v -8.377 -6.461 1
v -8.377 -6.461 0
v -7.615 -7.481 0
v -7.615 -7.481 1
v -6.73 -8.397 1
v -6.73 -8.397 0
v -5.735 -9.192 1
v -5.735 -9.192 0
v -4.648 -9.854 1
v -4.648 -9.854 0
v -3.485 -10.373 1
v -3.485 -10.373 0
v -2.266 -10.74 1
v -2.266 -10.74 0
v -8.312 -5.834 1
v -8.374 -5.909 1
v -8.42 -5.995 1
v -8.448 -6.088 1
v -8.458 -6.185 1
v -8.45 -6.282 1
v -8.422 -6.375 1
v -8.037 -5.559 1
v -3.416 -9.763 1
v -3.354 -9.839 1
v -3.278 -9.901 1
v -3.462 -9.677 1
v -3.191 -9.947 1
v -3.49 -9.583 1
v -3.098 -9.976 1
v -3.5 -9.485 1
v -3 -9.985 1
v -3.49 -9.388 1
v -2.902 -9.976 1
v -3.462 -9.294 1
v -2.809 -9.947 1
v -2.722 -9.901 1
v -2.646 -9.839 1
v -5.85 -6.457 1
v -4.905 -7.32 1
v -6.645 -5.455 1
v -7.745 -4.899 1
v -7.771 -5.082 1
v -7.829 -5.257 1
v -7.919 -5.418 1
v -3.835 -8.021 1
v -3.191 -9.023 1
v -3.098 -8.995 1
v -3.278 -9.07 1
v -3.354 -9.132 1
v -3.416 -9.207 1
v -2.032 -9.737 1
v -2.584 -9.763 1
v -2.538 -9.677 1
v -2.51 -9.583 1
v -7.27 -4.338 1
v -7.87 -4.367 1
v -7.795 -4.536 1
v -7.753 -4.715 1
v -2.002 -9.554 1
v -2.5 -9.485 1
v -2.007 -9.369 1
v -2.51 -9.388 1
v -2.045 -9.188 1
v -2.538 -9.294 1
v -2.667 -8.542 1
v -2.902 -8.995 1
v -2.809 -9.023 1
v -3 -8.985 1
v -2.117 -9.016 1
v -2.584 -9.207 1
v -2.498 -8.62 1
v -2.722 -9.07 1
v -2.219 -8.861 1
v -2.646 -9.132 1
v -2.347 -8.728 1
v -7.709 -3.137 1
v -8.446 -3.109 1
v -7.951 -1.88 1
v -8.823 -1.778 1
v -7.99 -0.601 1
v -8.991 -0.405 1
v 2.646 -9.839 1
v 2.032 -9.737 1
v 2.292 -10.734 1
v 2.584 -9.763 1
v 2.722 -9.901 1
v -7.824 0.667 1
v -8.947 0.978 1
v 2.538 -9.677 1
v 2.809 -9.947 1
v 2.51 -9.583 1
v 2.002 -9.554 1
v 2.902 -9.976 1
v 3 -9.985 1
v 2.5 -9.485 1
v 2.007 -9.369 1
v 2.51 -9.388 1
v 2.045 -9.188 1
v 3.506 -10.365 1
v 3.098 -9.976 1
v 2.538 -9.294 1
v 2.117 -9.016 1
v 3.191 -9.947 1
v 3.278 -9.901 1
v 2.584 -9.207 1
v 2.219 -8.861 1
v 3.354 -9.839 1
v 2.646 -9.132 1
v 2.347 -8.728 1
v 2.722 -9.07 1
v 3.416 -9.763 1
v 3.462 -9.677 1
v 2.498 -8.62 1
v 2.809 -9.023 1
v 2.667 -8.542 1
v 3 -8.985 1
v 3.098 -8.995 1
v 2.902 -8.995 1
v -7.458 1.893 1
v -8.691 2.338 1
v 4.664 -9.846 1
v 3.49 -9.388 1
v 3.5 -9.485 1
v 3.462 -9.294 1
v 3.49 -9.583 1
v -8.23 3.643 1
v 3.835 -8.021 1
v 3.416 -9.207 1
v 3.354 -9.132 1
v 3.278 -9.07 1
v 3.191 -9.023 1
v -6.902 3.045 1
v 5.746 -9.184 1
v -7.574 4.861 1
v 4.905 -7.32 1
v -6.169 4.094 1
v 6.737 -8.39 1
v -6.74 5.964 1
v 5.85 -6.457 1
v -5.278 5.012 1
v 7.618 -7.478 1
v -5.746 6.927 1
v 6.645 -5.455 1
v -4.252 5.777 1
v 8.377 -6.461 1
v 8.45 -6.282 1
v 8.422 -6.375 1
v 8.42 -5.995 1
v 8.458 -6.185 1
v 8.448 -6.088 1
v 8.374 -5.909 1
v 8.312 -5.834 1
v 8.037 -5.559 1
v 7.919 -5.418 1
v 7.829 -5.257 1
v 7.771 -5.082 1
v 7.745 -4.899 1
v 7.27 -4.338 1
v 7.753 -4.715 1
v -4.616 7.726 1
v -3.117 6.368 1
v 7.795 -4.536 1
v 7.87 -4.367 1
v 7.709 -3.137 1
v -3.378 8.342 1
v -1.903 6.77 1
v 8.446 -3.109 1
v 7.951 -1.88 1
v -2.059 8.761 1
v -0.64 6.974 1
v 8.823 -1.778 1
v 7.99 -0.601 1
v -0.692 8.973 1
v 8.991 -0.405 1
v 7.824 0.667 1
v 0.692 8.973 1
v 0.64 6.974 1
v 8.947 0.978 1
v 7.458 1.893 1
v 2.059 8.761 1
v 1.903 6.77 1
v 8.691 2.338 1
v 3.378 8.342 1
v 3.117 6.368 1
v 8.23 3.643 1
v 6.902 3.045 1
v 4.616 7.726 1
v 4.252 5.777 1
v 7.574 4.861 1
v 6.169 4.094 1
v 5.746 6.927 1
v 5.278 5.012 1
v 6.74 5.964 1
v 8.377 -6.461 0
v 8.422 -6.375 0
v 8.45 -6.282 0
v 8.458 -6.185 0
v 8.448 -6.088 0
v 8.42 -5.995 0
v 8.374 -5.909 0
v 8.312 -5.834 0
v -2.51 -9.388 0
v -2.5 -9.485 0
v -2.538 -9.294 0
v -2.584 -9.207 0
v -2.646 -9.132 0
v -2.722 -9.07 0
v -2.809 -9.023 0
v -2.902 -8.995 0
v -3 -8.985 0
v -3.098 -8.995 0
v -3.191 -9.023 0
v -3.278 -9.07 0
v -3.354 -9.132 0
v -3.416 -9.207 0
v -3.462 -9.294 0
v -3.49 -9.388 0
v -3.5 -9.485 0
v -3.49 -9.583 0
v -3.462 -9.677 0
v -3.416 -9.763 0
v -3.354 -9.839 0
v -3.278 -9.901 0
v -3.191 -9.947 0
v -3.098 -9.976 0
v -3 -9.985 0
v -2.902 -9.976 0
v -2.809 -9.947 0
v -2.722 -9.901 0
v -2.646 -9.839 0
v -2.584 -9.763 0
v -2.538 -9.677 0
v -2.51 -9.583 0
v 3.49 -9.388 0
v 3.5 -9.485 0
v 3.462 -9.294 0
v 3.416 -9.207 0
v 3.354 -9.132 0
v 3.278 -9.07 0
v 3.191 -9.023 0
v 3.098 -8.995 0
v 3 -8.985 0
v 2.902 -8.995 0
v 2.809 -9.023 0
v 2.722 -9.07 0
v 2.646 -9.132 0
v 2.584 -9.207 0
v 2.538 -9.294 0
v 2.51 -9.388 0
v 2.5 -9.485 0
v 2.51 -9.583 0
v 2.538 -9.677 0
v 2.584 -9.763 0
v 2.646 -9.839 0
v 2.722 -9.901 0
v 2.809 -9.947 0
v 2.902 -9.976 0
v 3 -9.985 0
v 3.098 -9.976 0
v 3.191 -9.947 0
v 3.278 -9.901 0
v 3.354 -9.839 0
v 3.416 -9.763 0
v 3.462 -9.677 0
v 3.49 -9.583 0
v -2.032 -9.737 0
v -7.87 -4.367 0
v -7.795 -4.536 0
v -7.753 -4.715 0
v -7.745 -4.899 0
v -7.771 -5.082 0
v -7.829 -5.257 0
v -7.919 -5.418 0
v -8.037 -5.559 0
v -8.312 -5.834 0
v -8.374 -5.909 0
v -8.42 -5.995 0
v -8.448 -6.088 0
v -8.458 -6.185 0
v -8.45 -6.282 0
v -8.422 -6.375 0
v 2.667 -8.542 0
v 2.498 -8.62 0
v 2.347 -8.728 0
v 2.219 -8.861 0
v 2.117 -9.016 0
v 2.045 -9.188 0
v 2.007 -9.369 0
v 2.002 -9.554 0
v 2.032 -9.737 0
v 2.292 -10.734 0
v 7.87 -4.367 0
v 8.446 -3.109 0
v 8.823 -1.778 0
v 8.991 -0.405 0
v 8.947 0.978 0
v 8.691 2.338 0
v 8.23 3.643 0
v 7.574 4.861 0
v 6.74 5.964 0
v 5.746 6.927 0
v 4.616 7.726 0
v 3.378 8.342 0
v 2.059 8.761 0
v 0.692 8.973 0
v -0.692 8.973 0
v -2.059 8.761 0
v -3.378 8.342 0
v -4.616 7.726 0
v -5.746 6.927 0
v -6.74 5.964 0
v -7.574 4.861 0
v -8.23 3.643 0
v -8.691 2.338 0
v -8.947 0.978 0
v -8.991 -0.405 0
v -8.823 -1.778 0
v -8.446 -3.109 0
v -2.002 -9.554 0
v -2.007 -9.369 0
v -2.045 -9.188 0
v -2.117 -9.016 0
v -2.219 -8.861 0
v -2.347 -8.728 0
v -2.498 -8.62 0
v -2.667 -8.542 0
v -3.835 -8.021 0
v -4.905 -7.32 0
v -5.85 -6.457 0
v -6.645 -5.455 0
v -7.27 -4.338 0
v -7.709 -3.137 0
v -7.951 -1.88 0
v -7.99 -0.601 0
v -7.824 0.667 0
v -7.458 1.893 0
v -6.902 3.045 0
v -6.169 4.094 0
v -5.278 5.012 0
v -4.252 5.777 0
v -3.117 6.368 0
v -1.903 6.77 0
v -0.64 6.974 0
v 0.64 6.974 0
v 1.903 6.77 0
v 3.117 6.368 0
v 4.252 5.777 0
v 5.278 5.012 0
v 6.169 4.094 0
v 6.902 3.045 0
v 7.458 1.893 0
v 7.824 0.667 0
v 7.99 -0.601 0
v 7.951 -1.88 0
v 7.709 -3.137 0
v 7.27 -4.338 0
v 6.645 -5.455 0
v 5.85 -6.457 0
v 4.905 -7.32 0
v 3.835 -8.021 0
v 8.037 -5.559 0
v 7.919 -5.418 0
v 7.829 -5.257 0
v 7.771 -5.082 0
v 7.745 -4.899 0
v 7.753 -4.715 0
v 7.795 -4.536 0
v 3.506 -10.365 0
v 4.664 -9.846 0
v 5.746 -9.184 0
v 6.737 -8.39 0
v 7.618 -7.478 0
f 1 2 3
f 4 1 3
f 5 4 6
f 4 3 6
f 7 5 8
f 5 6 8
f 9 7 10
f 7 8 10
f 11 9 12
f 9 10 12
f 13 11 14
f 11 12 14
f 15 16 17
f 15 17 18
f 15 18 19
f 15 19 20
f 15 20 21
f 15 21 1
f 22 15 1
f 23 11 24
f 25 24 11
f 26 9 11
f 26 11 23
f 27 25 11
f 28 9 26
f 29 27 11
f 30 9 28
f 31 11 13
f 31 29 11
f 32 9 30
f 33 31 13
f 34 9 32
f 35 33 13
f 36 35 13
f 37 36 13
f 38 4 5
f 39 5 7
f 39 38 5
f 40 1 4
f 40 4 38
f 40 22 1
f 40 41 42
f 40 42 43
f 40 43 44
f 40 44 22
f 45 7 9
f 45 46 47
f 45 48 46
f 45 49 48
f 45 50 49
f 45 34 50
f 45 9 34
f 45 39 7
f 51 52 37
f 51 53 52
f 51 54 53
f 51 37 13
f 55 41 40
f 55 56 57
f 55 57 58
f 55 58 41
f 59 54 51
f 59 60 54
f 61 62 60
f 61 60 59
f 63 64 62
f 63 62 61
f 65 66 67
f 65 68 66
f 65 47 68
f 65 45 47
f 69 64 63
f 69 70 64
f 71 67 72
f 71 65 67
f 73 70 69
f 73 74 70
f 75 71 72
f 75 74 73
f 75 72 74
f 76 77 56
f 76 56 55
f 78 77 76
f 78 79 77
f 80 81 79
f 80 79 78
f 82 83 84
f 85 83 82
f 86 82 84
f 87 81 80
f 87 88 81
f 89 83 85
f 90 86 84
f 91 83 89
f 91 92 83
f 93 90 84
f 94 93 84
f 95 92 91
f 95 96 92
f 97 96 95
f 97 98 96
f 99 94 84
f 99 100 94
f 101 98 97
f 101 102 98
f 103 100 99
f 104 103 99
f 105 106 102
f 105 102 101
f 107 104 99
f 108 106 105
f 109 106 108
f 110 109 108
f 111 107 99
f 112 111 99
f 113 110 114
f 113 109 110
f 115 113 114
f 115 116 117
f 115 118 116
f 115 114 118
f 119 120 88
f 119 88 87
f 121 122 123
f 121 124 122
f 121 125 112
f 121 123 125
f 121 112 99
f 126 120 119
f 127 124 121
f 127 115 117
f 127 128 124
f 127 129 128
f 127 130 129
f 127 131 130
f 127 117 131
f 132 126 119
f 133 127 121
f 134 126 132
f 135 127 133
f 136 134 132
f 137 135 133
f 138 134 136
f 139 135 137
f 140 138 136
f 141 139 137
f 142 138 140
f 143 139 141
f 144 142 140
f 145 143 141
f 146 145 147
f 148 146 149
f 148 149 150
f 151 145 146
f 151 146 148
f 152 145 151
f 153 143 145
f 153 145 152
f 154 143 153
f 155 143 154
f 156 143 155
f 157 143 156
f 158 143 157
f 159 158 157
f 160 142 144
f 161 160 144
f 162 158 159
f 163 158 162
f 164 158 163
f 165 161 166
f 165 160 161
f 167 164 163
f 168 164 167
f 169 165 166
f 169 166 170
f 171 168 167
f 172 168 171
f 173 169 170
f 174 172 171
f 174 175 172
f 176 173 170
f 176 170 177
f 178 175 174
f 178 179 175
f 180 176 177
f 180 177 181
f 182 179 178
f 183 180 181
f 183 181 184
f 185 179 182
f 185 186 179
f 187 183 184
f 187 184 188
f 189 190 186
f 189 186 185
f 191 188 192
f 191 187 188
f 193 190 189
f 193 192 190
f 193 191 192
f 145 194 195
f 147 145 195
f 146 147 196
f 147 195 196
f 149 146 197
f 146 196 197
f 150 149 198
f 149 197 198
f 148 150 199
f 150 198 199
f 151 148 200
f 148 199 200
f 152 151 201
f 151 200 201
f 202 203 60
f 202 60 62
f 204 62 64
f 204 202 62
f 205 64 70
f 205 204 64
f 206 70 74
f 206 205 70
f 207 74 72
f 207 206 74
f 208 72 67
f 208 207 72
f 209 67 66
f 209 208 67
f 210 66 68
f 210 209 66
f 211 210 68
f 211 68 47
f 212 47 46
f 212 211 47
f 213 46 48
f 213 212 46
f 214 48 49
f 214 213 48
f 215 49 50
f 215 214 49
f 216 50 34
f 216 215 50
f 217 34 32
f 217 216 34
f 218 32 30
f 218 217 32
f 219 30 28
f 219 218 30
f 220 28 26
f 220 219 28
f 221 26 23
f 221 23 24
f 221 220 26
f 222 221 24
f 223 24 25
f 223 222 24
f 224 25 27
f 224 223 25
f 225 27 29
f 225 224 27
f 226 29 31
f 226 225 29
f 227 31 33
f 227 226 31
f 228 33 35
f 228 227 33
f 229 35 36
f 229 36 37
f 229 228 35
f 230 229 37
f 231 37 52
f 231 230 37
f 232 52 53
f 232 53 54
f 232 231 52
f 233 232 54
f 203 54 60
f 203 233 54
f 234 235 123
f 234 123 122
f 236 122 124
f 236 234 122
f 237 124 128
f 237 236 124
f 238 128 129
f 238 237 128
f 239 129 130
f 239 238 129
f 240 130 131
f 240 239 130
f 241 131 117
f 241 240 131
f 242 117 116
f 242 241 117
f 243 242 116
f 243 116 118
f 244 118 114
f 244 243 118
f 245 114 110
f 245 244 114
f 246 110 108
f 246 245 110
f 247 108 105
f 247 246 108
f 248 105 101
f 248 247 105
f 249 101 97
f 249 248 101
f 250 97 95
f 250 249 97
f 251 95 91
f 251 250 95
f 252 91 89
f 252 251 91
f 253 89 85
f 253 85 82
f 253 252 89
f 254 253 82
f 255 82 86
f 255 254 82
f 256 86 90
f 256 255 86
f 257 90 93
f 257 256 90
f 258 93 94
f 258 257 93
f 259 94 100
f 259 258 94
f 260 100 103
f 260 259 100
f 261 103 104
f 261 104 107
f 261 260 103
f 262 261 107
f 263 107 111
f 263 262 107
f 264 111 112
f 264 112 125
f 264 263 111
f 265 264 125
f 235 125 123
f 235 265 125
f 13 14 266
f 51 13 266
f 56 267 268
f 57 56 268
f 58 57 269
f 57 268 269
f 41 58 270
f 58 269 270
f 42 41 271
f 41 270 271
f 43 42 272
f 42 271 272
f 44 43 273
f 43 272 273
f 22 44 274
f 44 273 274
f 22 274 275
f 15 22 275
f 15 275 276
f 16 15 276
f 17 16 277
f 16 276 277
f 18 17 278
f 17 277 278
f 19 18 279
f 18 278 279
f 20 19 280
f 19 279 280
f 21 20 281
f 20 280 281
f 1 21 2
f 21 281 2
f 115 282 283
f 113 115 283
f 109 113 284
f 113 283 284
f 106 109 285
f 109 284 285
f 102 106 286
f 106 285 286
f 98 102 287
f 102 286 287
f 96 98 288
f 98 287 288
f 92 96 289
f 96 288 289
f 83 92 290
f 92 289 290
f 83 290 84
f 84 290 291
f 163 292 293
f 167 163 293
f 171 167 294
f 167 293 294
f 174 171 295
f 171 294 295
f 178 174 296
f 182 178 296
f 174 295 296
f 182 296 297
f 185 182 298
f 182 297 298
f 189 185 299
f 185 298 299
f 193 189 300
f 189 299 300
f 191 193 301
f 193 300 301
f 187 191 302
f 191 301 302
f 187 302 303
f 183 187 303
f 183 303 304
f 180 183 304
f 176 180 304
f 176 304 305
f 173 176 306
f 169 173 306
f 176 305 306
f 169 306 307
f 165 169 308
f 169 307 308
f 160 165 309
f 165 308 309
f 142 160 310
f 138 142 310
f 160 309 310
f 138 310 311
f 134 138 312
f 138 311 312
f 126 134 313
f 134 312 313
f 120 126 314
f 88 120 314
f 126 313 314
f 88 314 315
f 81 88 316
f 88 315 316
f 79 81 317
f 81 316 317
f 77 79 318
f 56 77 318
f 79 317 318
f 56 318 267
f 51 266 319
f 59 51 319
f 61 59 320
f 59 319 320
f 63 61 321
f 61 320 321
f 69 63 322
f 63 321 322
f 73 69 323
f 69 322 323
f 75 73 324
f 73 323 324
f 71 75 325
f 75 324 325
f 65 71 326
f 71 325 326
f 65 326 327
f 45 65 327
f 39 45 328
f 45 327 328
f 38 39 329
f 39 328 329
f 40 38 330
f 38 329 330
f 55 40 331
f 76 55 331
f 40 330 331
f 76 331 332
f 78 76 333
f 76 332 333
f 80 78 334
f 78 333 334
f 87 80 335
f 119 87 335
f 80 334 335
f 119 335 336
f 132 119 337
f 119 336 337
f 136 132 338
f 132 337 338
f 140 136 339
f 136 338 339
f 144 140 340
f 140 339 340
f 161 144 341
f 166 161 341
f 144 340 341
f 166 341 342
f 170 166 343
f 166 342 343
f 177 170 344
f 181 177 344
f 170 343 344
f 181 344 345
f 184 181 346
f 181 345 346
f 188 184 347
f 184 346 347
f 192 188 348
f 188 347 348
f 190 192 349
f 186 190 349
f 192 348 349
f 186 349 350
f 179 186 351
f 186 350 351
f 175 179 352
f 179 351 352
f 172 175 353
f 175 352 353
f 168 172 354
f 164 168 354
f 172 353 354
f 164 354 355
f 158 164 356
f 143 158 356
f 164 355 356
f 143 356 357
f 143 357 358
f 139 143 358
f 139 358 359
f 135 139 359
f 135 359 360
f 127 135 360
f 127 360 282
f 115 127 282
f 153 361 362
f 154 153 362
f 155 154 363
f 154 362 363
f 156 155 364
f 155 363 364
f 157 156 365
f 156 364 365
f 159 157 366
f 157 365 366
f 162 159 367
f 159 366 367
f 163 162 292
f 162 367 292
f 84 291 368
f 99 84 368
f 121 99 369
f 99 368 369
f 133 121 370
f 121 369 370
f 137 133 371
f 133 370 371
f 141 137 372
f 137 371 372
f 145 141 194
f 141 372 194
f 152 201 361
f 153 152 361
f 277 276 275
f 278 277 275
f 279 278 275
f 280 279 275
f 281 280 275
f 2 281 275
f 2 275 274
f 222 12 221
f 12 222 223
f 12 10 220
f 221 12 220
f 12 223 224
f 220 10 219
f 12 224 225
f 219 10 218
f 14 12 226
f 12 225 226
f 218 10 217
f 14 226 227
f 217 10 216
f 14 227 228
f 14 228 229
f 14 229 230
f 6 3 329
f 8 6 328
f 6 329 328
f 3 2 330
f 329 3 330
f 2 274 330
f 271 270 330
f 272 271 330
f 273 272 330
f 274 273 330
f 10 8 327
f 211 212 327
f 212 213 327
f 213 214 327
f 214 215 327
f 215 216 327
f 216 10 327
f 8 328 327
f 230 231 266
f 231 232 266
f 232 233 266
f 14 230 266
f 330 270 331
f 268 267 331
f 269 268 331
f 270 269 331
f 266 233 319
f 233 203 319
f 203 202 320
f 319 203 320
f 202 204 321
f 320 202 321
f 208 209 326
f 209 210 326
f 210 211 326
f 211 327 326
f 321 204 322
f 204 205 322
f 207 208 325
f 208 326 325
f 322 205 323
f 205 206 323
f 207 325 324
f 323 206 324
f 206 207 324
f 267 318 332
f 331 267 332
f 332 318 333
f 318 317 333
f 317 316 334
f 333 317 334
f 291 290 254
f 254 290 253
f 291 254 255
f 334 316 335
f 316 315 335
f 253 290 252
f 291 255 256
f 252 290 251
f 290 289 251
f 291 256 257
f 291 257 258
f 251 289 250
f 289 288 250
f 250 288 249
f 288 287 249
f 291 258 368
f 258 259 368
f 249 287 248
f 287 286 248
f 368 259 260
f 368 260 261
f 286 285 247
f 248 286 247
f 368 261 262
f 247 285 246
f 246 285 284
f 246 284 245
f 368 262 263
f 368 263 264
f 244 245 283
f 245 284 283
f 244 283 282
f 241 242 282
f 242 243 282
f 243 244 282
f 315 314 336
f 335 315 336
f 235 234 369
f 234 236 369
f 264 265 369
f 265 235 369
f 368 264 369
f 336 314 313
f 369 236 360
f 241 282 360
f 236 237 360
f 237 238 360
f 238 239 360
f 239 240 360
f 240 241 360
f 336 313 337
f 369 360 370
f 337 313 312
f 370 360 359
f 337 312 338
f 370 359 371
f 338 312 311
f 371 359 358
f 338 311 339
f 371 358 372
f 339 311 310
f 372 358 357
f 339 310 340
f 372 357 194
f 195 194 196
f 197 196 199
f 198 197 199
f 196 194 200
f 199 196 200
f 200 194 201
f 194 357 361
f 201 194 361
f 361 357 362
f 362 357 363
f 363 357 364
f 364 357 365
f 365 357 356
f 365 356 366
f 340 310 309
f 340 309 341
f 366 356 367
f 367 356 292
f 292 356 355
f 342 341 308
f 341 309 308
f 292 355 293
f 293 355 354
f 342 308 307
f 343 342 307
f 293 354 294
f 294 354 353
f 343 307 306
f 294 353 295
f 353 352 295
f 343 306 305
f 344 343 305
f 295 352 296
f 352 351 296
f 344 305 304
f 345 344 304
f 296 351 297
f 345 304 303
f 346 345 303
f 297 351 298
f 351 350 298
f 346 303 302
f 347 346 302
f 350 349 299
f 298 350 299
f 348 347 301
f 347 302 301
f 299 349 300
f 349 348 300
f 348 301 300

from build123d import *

# Parameters (mm, degrees)
SKETCH1_R           = 0.5
BOSS_EXTRUDE1_DEPTH = 1


with BuildPart() as part:
    # Sketch1 → Boss-Extrude1 (new body)
    with BuildSketch(Plane.XY):
        with BuildLine():
            Line((-8.036806523, -5.559320723), (-8.311889028, -5.834403228))
            ThreePointArc((-8.311889028, -5.834403228), (-8.455641966, -6.136125974), (-8.377195408, -6.461006967))
            ThreePointArc((-8.377195408, -6.461006967), (-5.735345972, -9.191813388), (-2.265503441, -10.739994567))
            Line((-2.265503441, -10.739994567), (-2.032287486, -9.737337896))
            ThreePointArc((-2.032287486, -9.737337896), (-2.116763903, -9.016352811), (-2.666666667, -8.542472333))
            ThreePointArc((-2.666666667, -8.542472333), (0, 7), (2.666666667, -8.542472333))
            ThreePointArc((2.666666667, -8.542472333), (2.116763903, -9.016352811), (2.032287486, -9.737337896))
            Line((2.032287486, -9.737337896), (2.291840404, -10.733831084))
            ThreePointArc((2.291840404, -10.733831084), (5.746419561, -9.184049256), (8.377195408, -6.461006967))
            ThreePointArc((8.377195408, -6.461006967), (8.455641966, -6.136125974), (8.311889028, -5.834403228))
            Line((8.311889028, -5.834403228), (8.036806523, -5.559320723))
            ThreePointArc((8.036806523, -5.559320723), (7.753612497, -4.991153897), (7.869521974, -4.366992547))
            ThreePointArc((7.869521974, -4.366992547), (0, 9), (-7.869521974, -4.366992547))
            ThreePointArc((-7.869521974, -4.366992547), (-7.753612497, -4.991153897), (-8.036806523, -5.559320723))
        make_face()
        with Locations((-3, -9.485281374)):
            Circle(SKETCH1_R, mode=Mode.SUBTRACT)
        with Locations((3, -9.485281374)):
            Circle(SKETCH1_R, mode=Mode.SUBTRACT)
    extrude(amount=BOSS_EXTRUDE1_DEPTH)


solid = part.part
